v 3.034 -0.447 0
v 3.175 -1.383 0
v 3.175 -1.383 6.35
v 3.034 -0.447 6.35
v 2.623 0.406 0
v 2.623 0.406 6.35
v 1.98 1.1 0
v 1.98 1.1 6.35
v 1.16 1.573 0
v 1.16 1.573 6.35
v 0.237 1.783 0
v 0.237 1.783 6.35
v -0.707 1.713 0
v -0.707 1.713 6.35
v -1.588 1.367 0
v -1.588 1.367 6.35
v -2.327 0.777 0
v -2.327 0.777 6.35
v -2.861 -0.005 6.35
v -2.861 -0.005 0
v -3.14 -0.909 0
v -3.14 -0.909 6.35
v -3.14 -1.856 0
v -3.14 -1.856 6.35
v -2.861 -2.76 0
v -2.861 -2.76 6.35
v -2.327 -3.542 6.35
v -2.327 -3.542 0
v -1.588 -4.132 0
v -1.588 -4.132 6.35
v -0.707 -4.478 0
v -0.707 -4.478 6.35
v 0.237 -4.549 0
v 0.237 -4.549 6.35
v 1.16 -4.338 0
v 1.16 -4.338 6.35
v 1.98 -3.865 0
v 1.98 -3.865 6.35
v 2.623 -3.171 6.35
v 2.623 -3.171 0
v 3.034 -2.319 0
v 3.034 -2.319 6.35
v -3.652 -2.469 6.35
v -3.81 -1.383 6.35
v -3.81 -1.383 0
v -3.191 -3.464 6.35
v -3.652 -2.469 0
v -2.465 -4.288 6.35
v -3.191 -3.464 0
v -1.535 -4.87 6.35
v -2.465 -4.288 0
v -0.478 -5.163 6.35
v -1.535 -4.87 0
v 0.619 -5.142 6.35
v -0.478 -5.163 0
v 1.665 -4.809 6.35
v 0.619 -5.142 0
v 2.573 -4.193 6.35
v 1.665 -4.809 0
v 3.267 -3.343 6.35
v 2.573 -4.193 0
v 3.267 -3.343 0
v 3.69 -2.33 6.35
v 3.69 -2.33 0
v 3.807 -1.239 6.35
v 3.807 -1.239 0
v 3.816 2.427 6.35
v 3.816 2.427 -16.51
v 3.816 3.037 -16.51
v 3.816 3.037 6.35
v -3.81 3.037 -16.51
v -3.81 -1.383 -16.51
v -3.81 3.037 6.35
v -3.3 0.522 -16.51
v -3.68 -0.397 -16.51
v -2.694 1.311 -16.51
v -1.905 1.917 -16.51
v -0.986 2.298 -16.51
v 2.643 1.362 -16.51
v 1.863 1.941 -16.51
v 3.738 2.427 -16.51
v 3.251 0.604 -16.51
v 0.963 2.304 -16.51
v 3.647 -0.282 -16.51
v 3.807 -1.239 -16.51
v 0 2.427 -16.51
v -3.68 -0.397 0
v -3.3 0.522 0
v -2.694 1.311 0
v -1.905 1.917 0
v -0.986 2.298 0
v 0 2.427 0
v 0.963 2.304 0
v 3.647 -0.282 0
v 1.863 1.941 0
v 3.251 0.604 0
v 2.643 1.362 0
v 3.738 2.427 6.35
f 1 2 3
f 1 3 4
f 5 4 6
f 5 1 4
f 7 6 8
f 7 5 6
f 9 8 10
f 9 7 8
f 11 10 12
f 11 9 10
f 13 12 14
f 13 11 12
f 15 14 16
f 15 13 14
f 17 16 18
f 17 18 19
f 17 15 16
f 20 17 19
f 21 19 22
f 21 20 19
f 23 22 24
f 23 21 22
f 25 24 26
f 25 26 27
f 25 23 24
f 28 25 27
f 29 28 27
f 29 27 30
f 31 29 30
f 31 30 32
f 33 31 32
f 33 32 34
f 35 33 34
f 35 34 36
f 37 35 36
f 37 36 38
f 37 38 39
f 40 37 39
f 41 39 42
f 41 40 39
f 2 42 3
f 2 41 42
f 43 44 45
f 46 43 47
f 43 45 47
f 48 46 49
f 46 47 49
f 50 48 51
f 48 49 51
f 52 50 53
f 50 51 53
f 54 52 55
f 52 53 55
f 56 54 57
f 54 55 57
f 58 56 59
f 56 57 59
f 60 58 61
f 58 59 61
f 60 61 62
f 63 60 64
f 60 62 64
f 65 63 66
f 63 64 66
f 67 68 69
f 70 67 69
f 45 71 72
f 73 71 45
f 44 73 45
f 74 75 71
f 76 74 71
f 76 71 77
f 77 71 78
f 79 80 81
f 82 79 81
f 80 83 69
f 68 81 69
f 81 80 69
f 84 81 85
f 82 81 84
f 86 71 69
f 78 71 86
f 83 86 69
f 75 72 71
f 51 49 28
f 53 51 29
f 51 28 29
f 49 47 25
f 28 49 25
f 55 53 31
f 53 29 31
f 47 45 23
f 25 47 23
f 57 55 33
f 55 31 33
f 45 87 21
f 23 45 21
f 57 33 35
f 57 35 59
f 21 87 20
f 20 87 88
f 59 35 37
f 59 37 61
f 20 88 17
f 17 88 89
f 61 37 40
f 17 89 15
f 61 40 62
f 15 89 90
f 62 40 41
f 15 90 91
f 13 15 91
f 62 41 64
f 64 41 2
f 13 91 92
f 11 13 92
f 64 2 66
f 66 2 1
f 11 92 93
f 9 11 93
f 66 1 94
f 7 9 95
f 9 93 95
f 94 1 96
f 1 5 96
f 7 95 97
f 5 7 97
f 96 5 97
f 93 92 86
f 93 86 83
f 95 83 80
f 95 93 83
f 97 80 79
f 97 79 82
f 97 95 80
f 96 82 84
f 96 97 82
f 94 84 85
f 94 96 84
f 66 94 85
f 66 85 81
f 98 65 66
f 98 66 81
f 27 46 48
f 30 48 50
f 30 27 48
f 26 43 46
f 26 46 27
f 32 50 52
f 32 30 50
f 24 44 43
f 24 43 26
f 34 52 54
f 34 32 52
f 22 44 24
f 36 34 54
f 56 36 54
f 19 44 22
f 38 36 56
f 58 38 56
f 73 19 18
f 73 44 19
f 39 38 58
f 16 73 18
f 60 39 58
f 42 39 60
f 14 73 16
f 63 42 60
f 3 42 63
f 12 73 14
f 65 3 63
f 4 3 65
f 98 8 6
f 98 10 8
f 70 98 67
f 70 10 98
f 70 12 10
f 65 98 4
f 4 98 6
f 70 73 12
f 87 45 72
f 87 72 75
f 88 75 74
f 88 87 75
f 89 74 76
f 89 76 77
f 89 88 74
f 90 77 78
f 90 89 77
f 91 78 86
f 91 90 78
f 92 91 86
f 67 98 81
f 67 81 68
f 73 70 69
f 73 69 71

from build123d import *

# Parameters (mm, degrees)
F0_R     = 3.81
F0_R_2   = 3.175
F1_DEPTH = 6.35
F3_DEPTH = 22.86


with BuildPart() as f1:
    # F0 (on Top) → F1 (new body)
    with BuildSketch(Plane.XY):
        with Locations((0, -1.3826612849)):
            Circle(F0_R)
        with Locations((0, -1.3826612849)):
            Circle(F0_R_2, mode=Mode.SUBTRACT)
    extrude(amount=F1_DEPTH)

    # F2 (on face) → F3 (join)
    with BuildSketch(Plane.XY.offset(6.35)):
        with BuildLine():
            Line((-3.81, 2.4273387151), (-3.81, -1.3826612849))
            ThreePointArc((-3.81, -1.3826612849), (-2.6940768363, 1.3114155514), (0, 2.4273387151))
            Line((0, 2.4273387151), (-3.81, 2.4273387151))
        make_face()
        Polygon((-3.81, 2.4273387151), (0, 2.4273387151), (3.7383490708, 2.4273387151), (3.8155771326, 2.4273387151), (3.8155771326, 3.0369387151), (-3.81, 3.0369387151), align=None)
        with BuildLine():
            Line((3.7383490708, 2.4273387151), (0, 2.4273387151))
            ThreePointArc((0, 2.4273387151), (2.6429446594, 1.3615951767), (3.8073060154, -1.2394100895))
            Line((3.8073060154, -1.2394100895), (3.7383490708, 2.4273387151))
        make_face()
    extrude(amount=-F3_DEPTH)


solid = f1.part
